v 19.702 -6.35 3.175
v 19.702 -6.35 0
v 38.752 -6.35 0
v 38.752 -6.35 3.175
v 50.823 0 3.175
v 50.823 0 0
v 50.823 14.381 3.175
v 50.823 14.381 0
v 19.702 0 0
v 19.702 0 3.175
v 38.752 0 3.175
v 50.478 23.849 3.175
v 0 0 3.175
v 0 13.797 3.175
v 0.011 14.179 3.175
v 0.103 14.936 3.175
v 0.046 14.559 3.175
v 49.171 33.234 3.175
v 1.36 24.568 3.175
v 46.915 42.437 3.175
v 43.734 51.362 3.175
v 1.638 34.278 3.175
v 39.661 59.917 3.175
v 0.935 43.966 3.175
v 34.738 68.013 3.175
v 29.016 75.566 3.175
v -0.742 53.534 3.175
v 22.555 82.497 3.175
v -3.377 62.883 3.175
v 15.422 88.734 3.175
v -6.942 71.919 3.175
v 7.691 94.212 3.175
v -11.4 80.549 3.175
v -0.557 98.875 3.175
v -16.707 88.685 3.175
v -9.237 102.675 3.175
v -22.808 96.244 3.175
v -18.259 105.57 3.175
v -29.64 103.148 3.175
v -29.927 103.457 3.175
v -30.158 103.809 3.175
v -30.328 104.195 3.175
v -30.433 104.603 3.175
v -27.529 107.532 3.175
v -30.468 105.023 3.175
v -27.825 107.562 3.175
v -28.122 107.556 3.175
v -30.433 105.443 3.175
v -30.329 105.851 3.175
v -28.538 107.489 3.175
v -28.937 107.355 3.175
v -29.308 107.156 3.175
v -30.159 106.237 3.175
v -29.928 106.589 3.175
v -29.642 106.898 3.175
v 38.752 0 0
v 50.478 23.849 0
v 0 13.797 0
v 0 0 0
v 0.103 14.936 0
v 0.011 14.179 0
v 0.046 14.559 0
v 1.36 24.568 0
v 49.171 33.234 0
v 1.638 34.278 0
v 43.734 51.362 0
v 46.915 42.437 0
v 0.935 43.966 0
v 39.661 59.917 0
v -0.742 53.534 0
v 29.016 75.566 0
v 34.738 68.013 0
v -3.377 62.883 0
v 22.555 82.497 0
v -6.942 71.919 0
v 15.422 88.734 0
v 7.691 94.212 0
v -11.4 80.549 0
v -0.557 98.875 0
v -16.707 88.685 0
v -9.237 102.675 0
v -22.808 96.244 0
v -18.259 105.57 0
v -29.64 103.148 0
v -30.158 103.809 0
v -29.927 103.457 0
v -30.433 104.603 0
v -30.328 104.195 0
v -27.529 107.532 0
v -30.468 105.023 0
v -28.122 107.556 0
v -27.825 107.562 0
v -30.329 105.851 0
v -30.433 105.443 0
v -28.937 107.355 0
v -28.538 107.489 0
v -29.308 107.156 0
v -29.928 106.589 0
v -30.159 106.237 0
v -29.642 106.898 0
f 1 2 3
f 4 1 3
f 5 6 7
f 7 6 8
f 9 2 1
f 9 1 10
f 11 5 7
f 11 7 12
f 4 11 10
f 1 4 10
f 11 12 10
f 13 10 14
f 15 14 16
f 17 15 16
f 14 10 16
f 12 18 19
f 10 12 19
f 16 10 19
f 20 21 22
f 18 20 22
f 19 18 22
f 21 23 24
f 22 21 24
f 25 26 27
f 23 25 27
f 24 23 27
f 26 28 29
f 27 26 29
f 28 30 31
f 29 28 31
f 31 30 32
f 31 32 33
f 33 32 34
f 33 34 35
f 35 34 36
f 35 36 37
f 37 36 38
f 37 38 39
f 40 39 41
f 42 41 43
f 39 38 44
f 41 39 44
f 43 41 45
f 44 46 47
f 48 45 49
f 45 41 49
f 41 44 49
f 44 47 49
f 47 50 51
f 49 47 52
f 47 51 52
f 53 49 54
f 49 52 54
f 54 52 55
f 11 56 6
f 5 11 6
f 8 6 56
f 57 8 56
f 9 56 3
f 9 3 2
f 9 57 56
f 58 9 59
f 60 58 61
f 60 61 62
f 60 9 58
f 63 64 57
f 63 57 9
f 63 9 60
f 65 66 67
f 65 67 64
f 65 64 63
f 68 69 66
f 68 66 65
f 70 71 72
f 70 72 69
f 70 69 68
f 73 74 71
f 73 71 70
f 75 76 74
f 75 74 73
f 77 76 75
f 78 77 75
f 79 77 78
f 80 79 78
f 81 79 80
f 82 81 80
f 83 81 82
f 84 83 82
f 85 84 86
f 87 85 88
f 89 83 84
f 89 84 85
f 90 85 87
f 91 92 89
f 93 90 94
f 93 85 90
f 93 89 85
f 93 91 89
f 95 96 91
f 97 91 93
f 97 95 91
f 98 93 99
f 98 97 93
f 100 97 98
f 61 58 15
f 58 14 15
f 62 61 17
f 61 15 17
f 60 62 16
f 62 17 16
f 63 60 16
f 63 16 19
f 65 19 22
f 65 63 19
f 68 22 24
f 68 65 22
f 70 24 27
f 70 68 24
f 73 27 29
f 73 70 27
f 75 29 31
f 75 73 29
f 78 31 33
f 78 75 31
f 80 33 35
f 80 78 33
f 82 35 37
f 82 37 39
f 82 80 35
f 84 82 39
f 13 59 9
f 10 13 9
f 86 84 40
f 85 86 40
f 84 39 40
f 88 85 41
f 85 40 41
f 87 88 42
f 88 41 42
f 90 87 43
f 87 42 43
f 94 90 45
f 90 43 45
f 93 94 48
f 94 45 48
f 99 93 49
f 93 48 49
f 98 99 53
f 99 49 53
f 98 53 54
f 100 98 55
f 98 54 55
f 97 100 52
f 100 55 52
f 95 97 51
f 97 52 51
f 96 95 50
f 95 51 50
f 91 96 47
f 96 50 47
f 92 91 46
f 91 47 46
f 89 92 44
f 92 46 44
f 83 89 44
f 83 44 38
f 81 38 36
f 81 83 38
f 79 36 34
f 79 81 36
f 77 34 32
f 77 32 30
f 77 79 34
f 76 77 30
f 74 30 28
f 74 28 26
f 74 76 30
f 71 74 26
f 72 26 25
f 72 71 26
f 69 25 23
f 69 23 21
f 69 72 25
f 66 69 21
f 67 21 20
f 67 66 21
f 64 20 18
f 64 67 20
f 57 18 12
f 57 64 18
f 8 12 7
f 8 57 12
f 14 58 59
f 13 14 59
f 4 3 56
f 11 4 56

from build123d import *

# Parameters (mm, degrees)
SKETCH1_W           = 19.05
SKETCH1_H           = 6.35
BOSS_EXTRUDE2_DEPTH = 3.175
FILLET2_R           = 6.35
FILLET3_R           = 2.54


with BuildPart() as part:
    # Sketch1 → Boss-Extrude2 (new body)
    with BuildSketch(Plane.XY):
        with BuildLine():
            ThreePointArc((-36.016198934, 108.483524357), (26.192200246, 78.770561743), (50.822825228, 14.380520674))
            Line((50.822825228, 14.380520674), (0, 14.380520674))
            ThreePointArc((0, 14.380520674), (-4.688817641, 66.529733376), (-36.016198934, 108.483524357))
        make_face()
        Polygon((0, 0), (19.701608207, 0), (38.751608207, 0), (50.822825228, 0), (50.822825228, 14.380520674), (0, 14.380520674), align=None)
        with Locations((29.226608207, -3.175)):
            Rectangle(SKETCH1_W, SKETCH1_H)
    extrude(amount=BOSS_EXTRUDE2_DEPTH)

    # Fillet2
    fillet2_edges = [part.edges().sort_by_distance(p)[0] for p in [
        (50.822825228, 14.380520674, 1.5875),
        (0, 14.380520674, 1.5875),
    ]]
    fillet(fillet2_edges, radius=FILLET2_R)

    # Fillet3
    fillet3_edges = [part.edges().sort_by_distance(p)[0] for p in [
        (-36.016198934, 108.483524357, 1.5875),
    ]]
    fillet(fillet3_edges, radius=FILLET3_R)


solid = part.part
